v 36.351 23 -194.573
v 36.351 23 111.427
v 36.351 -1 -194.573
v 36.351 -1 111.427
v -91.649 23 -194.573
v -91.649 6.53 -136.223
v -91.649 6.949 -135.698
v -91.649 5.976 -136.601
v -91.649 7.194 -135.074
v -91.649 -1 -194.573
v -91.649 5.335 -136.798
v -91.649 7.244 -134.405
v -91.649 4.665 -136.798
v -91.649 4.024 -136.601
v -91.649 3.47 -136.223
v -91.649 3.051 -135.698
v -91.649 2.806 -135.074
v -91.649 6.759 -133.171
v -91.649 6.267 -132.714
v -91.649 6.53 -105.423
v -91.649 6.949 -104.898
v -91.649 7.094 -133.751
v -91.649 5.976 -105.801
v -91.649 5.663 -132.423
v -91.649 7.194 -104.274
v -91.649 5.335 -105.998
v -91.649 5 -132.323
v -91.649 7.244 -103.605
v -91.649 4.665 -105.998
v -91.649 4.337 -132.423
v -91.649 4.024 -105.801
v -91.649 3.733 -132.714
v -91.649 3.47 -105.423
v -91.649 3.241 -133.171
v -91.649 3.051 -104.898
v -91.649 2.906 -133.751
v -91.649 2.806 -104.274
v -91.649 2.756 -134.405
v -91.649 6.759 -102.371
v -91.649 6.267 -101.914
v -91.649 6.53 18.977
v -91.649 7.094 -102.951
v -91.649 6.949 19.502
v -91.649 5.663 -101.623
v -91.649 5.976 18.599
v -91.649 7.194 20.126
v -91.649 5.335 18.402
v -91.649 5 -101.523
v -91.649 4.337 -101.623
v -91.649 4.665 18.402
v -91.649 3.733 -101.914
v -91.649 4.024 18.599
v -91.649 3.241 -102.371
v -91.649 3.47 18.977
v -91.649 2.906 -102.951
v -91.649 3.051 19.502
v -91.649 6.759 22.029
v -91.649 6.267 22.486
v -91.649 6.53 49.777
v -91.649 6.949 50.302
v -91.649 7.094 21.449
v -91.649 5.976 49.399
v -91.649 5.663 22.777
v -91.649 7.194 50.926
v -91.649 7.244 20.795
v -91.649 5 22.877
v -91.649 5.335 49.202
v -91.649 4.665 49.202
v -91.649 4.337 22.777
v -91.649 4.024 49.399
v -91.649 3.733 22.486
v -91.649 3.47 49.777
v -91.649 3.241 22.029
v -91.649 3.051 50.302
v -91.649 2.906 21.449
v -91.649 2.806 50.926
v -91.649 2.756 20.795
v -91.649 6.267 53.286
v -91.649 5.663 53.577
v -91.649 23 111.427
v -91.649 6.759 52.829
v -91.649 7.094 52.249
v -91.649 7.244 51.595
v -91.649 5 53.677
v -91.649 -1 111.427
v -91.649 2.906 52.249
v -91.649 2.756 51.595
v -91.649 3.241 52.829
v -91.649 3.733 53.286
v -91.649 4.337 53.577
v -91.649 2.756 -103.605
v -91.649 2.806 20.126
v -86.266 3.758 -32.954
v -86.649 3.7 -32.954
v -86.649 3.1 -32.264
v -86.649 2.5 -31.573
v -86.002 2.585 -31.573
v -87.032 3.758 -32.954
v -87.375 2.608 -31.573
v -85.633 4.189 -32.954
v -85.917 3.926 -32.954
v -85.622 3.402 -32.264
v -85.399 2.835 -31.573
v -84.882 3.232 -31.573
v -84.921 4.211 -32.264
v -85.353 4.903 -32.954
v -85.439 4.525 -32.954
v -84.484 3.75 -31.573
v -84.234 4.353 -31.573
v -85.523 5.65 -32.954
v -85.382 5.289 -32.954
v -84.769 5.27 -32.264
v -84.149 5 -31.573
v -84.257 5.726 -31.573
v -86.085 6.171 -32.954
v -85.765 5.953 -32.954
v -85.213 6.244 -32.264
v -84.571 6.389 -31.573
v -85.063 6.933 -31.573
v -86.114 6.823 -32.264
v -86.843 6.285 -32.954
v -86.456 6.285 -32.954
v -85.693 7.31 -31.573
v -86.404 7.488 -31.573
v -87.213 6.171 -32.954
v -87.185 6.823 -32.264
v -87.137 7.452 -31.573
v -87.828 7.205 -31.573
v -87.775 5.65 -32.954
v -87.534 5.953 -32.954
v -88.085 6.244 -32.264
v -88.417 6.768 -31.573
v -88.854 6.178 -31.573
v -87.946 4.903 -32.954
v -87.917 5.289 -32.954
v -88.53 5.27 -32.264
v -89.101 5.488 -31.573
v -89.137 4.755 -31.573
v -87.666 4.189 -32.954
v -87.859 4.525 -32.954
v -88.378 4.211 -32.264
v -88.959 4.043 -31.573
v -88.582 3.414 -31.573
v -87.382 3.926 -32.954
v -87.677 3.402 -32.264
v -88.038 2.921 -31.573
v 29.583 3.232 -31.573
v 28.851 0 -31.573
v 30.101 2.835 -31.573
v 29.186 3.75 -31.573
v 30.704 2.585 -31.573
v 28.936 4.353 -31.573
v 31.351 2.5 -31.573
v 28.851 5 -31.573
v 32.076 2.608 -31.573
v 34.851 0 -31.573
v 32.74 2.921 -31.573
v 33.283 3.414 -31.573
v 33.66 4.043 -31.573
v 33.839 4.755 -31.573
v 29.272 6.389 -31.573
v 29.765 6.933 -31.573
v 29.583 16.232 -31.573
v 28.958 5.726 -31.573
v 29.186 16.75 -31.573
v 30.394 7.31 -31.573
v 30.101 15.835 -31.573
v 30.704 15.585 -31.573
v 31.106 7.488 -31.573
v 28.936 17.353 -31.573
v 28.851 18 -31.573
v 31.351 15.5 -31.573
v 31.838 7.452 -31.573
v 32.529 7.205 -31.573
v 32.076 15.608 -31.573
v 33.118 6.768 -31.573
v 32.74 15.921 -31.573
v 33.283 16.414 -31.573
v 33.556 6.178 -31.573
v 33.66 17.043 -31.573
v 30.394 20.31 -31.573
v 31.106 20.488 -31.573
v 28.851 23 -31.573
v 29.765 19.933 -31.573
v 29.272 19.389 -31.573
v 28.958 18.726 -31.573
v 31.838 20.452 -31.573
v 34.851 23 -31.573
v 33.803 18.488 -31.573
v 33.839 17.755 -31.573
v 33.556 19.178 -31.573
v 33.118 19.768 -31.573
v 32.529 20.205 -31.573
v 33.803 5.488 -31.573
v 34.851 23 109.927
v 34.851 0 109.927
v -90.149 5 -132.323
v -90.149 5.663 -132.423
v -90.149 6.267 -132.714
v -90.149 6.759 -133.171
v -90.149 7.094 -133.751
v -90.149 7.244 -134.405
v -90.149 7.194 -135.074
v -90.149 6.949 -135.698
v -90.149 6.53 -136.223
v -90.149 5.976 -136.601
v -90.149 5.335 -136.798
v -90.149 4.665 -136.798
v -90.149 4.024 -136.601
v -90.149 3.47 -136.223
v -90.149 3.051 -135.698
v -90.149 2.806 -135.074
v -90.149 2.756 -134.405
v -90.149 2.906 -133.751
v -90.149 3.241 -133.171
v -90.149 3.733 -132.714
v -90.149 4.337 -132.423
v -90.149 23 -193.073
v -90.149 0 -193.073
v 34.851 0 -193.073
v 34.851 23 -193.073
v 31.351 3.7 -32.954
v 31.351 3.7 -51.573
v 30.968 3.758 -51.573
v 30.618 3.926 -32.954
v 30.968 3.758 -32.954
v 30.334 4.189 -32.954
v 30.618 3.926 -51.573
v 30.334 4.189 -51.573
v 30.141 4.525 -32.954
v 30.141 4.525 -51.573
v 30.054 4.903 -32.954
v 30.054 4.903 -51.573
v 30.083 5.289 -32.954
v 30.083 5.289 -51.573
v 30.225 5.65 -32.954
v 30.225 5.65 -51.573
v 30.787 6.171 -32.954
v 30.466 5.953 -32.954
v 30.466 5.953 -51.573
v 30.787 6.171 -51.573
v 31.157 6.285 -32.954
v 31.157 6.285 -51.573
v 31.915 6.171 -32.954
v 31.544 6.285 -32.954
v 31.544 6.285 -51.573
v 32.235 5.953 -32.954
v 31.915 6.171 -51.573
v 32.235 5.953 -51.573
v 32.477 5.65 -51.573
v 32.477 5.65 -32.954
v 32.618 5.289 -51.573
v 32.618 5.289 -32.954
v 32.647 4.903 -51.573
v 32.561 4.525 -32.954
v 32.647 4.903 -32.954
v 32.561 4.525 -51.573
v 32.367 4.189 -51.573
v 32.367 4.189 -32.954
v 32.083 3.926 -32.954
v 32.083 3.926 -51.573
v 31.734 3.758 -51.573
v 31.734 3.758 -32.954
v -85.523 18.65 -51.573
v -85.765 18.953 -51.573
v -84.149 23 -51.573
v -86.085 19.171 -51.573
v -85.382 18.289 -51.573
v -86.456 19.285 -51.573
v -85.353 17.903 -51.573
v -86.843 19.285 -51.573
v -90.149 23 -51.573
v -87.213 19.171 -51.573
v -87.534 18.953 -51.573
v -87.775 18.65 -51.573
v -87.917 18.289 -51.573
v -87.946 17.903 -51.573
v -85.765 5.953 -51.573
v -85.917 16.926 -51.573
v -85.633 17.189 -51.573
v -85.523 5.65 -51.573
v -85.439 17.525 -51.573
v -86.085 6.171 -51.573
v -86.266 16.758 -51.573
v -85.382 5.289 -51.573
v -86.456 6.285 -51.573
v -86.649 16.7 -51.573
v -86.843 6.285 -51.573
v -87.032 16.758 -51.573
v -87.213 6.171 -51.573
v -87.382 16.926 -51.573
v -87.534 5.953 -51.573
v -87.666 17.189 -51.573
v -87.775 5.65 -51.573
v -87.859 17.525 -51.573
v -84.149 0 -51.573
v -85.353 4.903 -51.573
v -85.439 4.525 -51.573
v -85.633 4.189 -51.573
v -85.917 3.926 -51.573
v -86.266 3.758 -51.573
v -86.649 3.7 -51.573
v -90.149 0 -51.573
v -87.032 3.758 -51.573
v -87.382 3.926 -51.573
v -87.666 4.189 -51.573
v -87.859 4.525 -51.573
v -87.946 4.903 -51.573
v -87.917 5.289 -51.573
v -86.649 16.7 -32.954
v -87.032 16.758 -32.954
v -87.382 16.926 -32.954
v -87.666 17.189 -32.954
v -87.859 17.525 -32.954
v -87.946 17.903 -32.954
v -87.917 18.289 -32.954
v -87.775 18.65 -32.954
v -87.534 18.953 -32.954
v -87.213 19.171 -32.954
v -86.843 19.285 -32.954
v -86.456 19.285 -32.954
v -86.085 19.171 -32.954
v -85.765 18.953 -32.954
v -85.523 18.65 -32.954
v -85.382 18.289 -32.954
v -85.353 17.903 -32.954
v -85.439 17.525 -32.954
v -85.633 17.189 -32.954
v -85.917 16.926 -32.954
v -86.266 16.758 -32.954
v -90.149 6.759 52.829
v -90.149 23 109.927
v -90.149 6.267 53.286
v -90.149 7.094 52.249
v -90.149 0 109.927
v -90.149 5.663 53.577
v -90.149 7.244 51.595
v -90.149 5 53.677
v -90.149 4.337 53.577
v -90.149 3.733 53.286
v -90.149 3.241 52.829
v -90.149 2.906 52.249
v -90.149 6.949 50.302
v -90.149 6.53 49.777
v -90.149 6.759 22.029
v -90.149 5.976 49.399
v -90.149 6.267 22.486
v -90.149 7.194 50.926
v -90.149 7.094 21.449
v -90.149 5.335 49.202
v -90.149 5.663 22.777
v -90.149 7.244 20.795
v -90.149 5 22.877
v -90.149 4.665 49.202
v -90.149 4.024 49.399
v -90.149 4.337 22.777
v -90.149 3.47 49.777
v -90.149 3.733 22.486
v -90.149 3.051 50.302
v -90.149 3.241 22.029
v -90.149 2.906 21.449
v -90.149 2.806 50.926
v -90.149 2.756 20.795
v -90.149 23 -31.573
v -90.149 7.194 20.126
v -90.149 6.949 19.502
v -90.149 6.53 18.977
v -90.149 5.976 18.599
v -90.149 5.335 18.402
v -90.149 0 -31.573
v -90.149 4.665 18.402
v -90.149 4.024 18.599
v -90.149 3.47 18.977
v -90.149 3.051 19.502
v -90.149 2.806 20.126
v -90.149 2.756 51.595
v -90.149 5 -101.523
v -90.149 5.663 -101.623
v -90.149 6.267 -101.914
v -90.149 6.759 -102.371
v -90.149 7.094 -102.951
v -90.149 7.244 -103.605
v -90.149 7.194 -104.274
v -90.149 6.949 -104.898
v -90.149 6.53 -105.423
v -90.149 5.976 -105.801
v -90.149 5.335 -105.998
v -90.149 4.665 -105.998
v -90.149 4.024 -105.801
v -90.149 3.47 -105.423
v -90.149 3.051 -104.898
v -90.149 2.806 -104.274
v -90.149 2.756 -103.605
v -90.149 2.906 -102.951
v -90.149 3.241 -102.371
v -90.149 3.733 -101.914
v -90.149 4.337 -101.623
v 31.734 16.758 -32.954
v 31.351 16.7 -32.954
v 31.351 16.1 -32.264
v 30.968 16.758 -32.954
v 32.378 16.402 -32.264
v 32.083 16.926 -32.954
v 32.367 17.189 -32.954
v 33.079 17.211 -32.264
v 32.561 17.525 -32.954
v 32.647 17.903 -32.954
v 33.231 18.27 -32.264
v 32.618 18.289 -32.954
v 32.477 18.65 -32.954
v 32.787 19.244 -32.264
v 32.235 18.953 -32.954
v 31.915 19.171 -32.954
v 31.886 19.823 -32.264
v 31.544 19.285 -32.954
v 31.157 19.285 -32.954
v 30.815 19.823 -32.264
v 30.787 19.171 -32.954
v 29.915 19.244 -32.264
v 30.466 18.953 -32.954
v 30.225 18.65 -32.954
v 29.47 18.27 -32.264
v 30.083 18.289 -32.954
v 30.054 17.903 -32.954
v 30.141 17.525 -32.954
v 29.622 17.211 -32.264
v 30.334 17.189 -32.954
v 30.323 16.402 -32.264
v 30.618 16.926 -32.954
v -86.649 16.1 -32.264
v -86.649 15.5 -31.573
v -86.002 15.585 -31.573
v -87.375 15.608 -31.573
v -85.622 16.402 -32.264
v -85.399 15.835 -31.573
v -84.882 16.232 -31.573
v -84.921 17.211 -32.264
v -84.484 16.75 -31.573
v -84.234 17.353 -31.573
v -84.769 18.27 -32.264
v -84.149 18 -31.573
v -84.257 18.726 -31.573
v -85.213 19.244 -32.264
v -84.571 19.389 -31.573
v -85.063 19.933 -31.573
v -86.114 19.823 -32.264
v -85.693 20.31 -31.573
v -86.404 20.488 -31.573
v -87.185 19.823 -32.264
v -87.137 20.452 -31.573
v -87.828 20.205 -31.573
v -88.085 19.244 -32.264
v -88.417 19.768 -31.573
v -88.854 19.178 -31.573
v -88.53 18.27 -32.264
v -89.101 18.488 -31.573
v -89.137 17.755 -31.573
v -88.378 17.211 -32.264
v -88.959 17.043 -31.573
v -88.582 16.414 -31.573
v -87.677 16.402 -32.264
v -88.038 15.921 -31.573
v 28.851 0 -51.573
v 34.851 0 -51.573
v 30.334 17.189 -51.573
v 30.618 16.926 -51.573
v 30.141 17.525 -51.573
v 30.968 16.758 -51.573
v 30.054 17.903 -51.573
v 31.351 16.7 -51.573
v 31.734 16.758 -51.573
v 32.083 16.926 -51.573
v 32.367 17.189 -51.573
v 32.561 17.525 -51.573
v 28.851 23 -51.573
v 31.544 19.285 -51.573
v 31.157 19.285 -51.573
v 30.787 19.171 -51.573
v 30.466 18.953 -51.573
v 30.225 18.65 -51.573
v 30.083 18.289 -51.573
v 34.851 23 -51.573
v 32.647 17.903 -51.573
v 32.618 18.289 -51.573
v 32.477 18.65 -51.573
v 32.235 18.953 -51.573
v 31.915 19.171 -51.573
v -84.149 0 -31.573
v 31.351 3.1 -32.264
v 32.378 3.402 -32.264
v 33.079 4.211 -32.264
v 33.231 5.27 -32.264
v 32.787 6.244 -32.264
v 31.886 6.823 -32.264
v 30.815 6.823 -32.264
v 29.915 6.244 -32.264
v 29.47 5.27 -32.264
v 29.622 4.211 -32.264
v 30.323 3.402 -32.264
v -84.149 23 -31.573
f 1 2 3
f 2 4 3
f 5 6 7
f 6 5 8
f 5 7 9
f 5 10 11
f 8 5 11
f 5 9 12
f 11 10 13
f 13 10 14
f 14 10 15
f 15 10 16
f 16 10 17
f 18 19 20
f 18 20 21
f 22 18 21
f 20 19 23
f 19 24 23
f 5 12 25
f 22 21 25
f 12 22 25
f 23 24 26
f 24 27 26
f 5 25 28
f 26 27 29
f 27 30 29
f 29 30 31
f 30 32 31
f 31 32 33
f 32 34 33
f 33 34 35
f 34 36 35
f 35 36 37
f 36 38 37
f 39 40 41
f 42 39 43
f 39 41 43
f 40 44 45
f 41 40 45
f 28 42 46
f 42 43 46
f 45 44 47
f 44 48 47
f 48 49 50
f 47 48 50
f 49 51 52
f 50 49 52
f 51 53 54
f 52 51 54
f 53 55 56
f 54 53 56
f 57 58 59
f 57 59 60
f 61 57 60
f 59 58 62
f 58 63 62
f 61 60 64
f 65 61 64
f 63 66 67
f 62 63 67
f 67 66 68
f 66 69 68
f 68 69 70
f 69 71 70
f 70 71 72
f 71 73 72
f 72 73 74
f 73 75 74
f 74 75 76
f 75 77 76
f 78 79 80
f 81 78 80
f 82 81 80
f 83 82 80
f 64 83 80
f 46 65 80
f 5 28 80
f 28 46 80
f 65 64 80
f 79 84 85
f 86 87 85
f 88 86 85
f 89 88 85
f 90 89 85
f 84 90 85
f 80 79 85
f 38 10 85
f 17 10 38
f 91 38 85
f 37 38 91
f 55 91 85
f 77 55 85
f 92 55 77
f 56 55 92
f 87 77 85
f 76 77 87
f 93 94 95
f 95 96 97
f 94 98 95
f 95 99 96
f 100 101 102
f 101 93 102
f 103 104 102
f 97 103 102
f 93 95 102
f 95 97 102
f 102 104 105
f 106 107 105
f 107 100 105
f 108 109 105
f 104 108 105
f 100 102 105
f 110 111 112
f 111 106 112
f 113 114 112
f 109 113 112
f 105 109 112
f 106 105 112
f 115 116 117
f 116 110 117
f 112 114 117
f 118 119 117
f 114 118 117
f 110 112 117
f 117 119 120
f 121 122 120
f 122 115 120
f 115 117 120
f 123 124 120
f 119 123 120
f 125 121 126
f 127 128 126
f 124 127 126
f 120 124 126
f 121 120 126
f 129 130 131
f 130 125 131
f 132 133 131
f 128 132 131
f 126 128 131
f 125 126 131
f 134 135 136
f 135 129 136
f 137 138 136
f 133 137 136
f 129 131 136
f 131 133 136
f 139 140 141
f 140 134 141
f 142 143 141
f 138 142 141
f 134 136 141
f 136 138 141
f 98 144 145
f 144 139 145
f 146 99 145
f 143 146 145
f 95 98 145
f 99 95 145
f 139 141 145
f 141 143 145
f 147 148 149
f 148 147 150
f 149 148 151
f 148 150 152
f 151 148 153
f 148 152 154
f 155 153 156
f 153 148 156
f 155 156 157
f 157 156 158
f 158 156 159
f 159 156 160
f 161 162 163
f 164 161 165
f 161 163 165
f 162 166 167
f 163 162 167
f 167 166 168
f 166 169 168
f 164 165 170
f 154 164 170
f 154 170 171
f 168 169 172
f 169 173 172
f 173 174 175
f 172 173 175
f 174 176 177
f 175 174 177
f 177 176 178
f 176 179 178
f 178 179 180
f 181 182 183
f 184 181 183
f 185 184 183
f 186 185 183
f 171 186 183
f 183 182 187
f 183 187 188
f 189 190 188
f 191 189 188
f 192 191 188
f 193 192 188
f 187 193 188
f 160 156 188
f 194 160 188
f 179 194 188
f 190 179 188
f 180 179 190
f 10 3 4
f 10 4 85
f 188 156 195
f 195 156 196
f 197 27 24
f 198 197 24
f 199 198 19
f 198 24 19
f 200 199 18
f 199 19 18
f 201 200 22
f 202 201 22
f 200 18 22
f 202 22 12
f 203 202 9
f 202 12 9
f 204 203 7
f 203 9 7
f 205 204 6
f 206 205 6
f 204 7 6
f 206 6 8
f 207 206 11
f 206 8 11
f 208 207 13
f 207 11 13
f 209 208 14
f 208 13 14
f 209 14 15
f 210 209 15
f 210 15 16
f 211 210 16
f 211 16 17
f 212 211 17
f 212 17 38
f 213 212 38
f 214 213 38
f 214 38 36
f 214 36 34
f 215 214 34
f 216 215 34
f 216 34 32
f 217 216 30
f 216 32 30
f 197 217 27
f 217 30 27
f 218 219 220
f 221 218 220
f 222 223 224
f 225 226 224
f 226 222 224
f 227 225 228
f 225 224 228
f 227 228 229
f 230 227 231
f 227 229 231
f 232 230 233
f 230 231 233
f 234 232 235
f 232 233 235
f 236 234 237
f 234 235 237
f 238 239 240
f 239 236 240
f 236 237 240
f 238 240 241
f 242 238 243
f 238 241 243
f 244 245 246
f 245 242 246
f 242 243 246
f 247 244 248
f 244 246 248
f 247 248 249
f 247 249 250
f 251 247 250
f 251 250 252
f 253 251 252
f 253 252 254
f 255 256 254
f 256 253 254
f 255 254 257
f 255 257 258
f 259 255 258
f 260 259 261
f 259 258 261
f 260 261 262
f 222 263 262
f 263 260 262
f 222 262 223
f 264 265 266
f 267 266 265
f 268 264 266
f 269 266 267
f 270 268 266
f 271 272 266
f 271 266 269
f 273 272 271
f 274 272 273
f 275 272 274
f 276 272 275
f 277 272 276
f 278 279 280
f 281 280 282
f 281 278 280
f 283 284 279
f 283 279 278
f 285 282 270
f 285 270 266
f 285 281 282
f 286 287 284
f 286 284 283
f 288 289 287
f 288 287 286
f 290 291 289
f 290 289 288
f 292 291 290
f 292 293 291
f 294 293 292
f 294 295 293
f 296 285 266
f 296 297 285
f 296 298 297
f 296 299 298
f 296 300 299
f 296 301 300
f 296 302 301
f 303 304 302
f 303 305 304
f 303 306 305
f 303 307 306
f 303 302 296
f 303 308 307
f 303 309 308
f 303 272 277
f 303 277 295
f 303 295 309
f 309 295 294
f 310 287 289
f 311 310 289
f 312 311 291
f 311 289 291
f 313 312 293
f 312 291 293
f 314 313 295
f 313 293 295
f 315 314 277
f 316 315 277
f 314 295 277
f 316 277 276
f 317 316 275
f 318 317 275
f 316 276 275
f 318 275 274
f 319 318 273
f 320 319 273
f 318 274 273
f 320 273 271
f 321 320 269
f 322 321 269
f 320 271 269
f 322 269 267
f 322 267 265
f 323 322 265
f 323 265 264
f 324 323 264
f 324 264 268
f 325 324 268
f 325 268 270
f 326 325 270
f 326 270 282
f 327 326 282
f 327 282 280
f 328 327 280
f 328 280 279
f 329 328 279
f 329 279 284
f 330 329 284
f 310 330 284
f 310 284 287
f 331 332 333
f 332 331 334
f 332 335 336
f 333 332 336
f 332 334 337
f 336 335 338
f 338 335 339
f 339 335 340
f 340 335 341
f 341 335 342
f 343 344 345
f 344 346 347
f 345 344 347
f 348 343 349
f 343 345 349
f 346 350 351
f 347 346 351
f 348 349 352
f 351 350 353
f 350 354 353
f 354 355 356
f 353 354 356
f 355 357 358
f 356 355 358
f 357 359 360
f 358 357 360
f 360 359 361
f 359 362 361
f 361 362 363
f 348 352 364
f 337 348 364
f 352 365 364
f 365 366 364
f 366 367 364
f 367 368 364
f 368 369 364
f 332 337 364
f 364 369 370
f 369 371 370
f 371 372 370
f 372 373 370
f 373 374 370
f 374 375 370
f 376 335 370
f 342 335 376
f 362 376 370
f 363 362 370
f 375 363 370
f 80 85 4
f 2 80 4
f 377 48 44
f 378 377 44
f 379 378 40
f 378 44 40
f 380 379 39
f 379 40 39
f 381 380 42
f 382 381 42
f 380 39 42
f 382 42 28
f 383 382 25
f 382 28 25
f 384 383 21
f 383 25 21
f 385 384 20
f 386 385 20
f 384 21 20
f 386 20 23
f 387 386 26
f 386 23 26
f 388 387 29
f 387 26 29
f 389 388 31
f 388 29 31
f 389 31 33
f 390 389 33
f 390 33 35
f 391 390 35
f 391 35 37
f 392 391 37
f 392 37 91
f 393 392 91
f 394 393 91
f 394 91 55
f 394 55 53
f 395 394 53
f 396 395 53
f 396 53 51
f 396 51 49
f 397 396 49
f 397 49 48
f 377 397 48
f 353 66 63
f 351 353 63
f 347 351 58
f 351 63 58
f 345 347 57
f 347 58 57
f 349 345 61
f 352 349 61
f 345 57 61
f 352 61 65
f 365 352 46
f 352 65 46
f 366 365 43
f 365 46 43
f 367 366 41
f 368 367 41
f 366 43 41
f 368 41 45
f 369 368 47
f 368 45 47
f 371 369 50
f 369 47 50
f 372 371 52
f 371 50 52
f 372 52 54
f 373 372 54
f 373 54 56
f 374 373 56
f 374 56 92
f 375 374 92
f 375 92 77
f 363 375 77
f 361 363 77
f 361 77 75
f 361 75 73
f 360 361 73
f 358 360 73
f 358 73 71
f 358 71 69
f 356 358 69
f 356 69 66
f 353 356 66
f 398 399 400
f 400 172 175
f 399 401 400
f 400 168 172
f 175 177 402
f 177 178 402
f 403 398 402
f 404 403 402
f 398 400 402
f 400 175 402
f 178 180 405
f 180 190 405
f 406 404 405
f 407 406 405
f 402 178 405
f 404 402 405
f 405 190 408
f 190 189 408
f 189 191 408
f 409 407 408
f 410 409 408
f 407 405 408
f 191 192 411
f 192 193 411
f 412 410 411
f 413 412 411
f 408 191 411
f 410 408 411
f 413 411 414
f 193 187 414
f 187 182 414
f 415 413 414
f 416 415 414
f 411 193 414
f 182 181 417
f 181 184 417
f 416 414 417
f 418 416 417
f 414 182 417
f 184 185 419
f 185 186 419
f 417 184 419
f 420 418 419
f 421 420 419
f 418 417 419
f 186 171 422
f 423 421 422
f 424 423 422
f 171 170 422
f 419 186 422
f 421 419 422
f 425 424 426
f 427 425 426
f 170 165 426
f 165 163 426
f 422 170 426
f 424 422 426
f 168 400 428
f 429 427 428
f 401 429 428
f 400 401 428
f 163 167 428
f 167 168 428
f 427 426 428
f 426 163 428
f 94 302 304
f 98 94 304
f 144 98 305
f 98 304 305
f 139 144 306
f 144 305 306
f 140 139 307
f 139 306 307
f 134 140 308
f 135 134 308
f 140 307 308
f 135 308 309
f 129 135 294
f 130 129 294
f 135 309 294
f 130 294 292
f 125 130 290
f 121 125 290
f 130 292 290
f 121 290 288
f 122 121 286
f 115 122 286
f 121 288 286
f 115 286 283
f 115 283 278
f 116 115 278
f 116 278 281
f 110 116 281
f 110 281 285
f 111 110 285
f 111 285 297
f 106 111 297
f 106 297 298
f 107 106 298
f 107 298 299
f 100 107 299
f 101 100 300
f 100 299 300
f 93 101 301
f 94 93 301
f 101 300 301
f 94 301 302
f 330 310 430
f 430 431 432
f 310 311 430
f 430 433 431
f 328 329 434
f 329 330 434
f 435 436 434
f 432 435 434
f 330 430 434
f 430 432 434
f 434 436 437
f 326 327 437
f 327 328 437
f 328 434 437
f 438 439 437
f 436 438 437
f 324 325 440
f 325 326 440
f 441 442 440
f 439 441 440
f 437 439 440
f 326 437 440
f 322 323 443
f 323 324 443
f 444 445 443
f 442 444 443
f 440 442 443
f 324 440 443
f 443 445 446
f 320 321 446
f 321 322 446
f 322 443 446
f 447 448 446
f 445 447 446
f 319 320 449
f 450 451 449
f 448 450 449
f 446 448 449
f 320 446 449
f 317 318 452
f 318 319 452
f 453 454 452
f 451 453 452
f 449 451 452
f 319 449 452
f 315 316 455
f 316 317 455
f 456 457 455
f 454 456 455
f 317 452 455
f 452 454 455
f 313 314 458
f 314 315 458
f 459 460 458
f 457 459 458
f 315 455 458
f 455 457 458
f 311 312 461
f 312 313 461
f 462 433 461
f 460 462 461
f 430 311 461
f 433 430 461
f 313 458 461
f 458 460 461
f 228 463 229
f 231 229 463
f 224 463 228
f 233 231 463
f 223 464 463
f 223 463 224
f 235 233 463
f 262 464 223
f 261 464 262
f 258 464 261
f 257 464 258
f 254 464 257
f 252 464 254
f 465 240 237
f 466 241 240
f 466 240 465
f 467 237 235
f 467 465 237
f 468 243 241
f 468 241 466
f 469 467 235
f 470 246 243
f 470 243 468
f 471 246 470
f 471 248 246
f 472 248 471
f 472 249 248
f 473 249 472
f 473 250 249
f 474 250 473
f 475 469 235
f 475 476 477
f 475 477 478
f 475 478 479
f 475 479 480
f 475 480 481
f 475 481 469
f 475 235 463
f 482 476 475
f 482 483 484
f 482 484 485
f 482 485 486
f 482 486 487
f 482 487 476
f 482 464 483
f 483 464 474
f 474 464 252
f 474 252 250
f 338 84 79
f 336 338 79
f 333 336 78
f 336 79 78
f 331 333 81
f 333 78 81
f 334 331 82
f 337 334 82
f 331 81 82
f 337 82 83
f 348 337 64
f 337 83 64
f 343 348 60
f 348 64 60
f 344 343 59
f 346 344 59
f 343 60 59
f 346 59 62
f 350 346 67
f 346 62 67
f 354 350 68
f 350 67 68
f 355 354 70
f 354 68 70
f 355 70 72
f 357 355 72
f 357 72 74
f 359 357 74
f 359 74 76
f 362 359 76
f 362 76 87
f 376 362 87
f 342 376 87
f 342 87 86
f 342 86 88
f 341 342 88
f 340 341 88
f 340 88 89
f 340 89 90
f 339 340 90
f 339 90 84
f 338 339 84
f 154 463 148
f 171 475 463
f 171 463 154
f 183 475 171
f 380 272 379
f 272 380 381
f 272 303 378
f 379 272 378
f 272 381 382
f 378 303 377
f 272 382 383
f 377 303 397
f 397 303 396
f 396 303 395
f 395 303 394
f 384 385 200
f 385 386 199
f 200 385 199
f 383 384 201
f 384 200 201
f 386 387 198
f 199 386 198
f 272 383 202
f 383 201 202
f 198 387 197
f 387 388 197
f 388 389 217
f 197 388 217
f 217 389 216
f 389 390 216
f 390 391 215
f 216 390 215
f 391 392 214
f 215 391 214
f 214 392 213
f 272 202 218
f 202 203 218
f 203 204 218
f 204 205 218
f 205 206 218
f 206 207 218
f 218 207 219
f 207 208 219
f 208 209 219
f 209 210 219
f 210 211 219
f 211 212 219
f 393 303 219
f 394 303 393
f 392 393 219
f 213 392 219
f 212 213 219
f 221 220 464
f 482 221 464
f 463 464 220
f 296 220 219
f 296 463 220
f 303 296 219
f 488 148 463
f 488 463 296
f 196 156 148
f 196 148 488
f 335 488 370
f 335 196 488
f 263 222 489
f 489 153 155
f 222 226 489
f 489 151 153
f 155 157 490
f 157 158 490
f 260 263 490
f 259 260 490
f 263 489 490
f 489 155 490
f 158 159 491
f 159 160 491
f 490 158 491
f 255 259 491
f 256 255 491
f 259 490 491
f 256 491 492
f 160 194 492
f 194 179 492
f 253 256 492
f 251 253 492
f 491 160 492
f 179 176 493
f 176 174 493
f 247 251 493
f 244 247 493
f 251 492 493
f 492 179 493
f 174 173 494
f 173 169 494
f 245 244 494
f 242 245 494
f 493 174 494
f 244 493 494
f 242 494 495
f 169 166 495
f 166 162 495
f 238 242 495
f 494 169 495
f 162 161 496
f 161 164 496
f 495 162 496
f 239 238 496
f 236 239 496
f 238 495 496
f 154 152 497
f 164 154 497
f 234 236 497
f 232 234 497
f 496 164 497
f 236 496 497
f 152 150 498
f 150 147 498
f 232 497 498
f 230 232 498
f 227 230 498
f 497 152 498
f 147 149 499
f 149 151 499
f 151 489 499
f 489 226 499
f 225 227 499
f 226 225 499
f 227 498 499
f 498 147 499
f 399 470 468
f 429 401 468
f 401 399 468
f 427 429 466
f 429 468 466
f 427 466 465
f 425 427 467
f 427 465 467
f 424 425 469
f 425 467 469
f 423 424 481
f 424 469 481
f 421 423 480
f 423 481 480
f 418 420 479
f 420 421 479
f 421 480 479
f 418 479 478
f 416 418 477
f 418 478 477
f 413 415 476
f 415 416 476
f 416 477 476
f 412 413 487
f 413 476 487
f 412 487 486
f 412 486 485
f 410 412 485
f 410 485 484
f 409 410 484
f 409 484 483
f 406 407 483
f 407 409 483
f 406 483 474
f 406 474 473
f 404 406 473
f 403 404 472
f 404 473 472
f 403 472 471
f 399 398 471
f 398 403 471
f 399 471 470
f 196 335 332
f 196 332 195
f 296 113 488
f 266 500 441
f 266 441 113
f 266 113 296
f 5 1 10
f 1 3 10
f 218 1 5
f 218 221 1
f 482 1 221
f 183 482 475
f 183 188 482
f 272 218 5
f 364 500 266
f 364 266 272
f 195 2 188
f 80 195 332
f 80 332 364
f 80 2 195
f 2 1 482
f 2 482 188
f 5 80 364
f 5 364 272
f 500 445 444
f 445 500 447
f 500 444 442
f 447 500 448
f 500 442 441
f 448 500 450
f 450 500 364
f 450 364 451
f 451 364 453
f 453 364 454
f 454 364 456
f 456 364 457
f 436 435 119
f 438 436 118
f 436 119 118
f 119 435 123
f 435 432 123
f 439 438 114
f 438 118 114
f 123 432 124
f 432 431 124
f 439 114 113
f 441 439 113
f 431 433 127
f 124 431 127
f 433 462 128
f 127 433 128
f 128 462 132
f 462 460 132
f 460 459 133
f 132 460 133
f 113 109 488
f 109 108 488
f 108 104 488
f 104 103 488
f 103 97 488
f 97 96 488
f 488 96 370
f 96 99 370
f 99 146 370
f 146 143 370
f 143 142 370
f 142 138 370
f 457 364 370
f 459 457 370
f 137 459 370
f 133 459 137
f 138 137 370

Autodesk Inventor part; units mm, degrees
ref_plane "YZ Plane" through (0, 0, 0) normal (1, 0, 0) x (0, 1, 0)
ref_plane "XZ Plane" through (0, 0, 0) normal (0, 1, 0) x (-1, 0, 0)
ref_plane "XY Plane" through (0, 0, 0) normal (0, 0, 1) x (1, 0, 0)
sketch "Sketch1" plane through (0, 0, 0) normal (0, 1, 0) x (-1, 0, 0)
  line L0 (80.1493, 105.9266) -> (-24.8507, 105.9266) construction
  line L1 (-24.8507, 105.9266) -> (-24.8507, -189.0734) construction
  line L2 (-24.8507, -189.0734) -> (80.1493, -189.0734) construction
  line L3 (80.1493, -189.0734) -> (80.1493, 105.9266) construction
  line L4 (80.1493, 91.9266) -> (83.1493, 91.9266) construction
  line L5 (83.1493, 91.9266) -> (83.1493, 84.3266) construction
  line L6 (83.1493, 84.3266) -> (80.1493, 84.3266) construction
  line L7 (80.1493, 84.3266) -> (80.1493, 91.9266) construction
  point P0 (0, 0)
  dimension "d0" = 295
  dimension "d1" = 105
  dimension "d2" = 7.6
  dimension "d3" = 3
  dimension "d4" = 14
sketch "Sketch2" plane through (0, 0, 0) normal (0, 1, 0) x (-1, 0, 0)
  line L0 (80.1493, -189.0734) -> (80.1493, 105.9266) construction
  line L1 (-24.8507, -189.0734) -> (80.1493, -189.0734) construction
  line L2 (-24.8507, 105.9266) -> (-24.8507, -189.0734) construction
  line L3 (80.1493, 105.9266) -> (-24.8507, 105.9266) construction
  line L4 (90.1493, 109.9266) -> (90.1493, -193.0734)
  line L5 (-34.8507, -193.0734) -> (-34.8507, 109.9266)
  line L6 (90.1493, 109.9266) -> (-34.8507, 109.9266)
  line L7 (90.1493, -193.0734) -> (-34.8507, -193.0734)
  line L8 (91.6493, -194.5734) -> (91.6493, 111.4266)
  line L9 (91.6493, 111.4266) -> (-36.3507, 111.4266)
  line L10 (-36.3507, 111.4266) -> (-36.3507, -194.5734)
  line L11 (-36.3507, -194.5734) -> (91.6493, -194.5734)
  dimension "d71" = 10
  dimension "d72" = 4
  dimension "d73" = 10
  dimension "d74" = 4
  dimension "d75" = 1.5
extrude "Extrusion1" add sketch "Sketch2" against normal blind 1 contours L4 L7 L5 L6
extrude "Extrusion2" add sketch "Sketch2" along normal blind 23 and the other way blind 1
sketch "Sketch5" plane through (-91.6493, -1, 111.4266) normal (-1, 0, 0) x (0, 0, 1)
  circle A0 centre (-246, 6) radius 2.25
  circle A1 centre (-90.8, 6) radius 2.25
  circle A2 centre (-215.2, 6) radius 2.25
  circle A3 centre (-60, 6) radius 2.25
  line L0 (0, 0) -> (0, 24) projected
  line L1 (-306, 24) -> (0, 24) projected
  line L2 (-306, 24) -> (-306, 0) projected
  line L3 (0, 0) -> (-306, 0) projected
  point P0 (-111.4266, 1)
  dimension "d35" = 4.5
  dimension "d37" = 4.5
  dimension "d39" = 4.5
  dimension "d40" = 0
  dimension "d41" = 30.8
  dimension "d45" = 4.5
  dimension "d46" = 0
  dimension "d47" = 30.8
  dimension "d76" = 60
  dimension "d77" = 60
  dimension "d144" = 18
  dimension "d145" = 18
extrude "Extrusion4" cut sketch "Sketch5" against normal up to surface (1.5 mm away) contours A0 | A1 | A2 | A3
sketch "Sketch7" plane through (-90.1493, 0, -193.0734) normal (1, 0, 0) x (0, 0, -1)
  line L0 (-151.5, 23) -> (-151.5, 0) construction
  line L1 (-141.5, 23) -> (-141.5, 0)
  line L2 (-161.5, 23) -> (-161.5, 0)
  line L3 (-303, 23) -> (0, 23) projected
  line L4 (-303, 0) -> (0, 0) projected
  line L5 (0, 23) -> (0, 0) projected
  dimension "d106" = 10
  dimension "d107" = 10
  dimension "d148" = 151.5
  dimension "d149" = 151.5
extrude "Extrusion6" add sketch "Sketch7" along normal blind 6 contours L1 L4 L2 L3
ref_plane "Work Plane2" through (-27.6493, 0, 109.9266) normal (1, 0, 0) x (0, 0, -1)
ref_plane "Work Plane4" through (-90.1493, 0, -41.5734) normal (0, 0, 1) x (1, 0, 0)
sketch "Sketch16" plane through (-90.1493, 0, -31.5734) normal (0, 0, 1) x (1, 0, 0)
  line L0 (0, 0) -> (0, 23) projected
  line L1 (0, 23) -> (6, 23) projected
  point P0 (90.1493, 0)
  point P1 (3.5, 18)
  dimension "d108" = 3.5
  dimension "d109" = 5
hole "Hole3" at (-86.6493, 18, -31.5734) direction (0, 0, -1) diameter 2.6 depth 5 countersink diameter 5 countersink angle 82
sketch "Sketch17" plane through (-86.6493, 18, -36.5734) normal (0, 0, 1) x (1, 0, 0)
  circle A0 centre (0, 0) radius 1.3 projected
  point P0 (86.6493, -18)
hole "Hole4" at (-86.6493, 18, -36.5734) direction (0, 0, -1) diameter 2.6 depth 15 tip angle 118
sketch "Sketch18" plane through (-90.1493, 0, -31.5734) normal (0, 0, 1) x (1, 0, 0)
  line L0 (0, 0) -> (0, 23) projected
  line L1 (6, 0) -> (0, 0) projected
  point P0 (90.1493, 0)
  point P1 (3.5, 5)
  point P2 (0, 18)
  dimension "d124" = 3.5
  dimension "d125" = 5
hole "Hole5" at (-86.6493, 5, -31.5734) direction (0, 0, -1) diameter 2.6 depth 5 countersink diameter 5 countersink angle 82
sketch "Sketch19" plane through (-86.6493, 5, -36.5734) normal (0, 0, 1) x (1, 0, 0)
  circle A0 centre (0, 0) radius 1.3 projected
  point P0 (86.6493, -5)
hole "Hole6" at (-86.6493, 5, -36.5734) direction (0, 0, -1) diameter 2.6 depth 15 tip angle 118
mirror "Mirror6" about plane through (-27.6493, 0, 109.9266) normal (1, 0, 0) of "Extrusion6", "Hole3", "Hole5", "Hole4", "Hole6"
sketch "Sketch21" plane through (-90.1493, 0, -41.5734) normal (0, 0, 1) x (1, 0, 0)
  line L0 (-38.4696, 48.4578) -> (185.798, 48.4578)
  line L1 (185.798, 48.4578) -> (185.798, -48.9918)
  line L2 (185.798, -48.9918) -> (-38.4696, -48.9918)
  line L3 (-38.4696, -48.9918) -> (-38.4696, 48.4578)
  point P0 (90.1493, 0)
extrude "Extrusion12" [suppressed]
properties part number "Case Tastiera"
